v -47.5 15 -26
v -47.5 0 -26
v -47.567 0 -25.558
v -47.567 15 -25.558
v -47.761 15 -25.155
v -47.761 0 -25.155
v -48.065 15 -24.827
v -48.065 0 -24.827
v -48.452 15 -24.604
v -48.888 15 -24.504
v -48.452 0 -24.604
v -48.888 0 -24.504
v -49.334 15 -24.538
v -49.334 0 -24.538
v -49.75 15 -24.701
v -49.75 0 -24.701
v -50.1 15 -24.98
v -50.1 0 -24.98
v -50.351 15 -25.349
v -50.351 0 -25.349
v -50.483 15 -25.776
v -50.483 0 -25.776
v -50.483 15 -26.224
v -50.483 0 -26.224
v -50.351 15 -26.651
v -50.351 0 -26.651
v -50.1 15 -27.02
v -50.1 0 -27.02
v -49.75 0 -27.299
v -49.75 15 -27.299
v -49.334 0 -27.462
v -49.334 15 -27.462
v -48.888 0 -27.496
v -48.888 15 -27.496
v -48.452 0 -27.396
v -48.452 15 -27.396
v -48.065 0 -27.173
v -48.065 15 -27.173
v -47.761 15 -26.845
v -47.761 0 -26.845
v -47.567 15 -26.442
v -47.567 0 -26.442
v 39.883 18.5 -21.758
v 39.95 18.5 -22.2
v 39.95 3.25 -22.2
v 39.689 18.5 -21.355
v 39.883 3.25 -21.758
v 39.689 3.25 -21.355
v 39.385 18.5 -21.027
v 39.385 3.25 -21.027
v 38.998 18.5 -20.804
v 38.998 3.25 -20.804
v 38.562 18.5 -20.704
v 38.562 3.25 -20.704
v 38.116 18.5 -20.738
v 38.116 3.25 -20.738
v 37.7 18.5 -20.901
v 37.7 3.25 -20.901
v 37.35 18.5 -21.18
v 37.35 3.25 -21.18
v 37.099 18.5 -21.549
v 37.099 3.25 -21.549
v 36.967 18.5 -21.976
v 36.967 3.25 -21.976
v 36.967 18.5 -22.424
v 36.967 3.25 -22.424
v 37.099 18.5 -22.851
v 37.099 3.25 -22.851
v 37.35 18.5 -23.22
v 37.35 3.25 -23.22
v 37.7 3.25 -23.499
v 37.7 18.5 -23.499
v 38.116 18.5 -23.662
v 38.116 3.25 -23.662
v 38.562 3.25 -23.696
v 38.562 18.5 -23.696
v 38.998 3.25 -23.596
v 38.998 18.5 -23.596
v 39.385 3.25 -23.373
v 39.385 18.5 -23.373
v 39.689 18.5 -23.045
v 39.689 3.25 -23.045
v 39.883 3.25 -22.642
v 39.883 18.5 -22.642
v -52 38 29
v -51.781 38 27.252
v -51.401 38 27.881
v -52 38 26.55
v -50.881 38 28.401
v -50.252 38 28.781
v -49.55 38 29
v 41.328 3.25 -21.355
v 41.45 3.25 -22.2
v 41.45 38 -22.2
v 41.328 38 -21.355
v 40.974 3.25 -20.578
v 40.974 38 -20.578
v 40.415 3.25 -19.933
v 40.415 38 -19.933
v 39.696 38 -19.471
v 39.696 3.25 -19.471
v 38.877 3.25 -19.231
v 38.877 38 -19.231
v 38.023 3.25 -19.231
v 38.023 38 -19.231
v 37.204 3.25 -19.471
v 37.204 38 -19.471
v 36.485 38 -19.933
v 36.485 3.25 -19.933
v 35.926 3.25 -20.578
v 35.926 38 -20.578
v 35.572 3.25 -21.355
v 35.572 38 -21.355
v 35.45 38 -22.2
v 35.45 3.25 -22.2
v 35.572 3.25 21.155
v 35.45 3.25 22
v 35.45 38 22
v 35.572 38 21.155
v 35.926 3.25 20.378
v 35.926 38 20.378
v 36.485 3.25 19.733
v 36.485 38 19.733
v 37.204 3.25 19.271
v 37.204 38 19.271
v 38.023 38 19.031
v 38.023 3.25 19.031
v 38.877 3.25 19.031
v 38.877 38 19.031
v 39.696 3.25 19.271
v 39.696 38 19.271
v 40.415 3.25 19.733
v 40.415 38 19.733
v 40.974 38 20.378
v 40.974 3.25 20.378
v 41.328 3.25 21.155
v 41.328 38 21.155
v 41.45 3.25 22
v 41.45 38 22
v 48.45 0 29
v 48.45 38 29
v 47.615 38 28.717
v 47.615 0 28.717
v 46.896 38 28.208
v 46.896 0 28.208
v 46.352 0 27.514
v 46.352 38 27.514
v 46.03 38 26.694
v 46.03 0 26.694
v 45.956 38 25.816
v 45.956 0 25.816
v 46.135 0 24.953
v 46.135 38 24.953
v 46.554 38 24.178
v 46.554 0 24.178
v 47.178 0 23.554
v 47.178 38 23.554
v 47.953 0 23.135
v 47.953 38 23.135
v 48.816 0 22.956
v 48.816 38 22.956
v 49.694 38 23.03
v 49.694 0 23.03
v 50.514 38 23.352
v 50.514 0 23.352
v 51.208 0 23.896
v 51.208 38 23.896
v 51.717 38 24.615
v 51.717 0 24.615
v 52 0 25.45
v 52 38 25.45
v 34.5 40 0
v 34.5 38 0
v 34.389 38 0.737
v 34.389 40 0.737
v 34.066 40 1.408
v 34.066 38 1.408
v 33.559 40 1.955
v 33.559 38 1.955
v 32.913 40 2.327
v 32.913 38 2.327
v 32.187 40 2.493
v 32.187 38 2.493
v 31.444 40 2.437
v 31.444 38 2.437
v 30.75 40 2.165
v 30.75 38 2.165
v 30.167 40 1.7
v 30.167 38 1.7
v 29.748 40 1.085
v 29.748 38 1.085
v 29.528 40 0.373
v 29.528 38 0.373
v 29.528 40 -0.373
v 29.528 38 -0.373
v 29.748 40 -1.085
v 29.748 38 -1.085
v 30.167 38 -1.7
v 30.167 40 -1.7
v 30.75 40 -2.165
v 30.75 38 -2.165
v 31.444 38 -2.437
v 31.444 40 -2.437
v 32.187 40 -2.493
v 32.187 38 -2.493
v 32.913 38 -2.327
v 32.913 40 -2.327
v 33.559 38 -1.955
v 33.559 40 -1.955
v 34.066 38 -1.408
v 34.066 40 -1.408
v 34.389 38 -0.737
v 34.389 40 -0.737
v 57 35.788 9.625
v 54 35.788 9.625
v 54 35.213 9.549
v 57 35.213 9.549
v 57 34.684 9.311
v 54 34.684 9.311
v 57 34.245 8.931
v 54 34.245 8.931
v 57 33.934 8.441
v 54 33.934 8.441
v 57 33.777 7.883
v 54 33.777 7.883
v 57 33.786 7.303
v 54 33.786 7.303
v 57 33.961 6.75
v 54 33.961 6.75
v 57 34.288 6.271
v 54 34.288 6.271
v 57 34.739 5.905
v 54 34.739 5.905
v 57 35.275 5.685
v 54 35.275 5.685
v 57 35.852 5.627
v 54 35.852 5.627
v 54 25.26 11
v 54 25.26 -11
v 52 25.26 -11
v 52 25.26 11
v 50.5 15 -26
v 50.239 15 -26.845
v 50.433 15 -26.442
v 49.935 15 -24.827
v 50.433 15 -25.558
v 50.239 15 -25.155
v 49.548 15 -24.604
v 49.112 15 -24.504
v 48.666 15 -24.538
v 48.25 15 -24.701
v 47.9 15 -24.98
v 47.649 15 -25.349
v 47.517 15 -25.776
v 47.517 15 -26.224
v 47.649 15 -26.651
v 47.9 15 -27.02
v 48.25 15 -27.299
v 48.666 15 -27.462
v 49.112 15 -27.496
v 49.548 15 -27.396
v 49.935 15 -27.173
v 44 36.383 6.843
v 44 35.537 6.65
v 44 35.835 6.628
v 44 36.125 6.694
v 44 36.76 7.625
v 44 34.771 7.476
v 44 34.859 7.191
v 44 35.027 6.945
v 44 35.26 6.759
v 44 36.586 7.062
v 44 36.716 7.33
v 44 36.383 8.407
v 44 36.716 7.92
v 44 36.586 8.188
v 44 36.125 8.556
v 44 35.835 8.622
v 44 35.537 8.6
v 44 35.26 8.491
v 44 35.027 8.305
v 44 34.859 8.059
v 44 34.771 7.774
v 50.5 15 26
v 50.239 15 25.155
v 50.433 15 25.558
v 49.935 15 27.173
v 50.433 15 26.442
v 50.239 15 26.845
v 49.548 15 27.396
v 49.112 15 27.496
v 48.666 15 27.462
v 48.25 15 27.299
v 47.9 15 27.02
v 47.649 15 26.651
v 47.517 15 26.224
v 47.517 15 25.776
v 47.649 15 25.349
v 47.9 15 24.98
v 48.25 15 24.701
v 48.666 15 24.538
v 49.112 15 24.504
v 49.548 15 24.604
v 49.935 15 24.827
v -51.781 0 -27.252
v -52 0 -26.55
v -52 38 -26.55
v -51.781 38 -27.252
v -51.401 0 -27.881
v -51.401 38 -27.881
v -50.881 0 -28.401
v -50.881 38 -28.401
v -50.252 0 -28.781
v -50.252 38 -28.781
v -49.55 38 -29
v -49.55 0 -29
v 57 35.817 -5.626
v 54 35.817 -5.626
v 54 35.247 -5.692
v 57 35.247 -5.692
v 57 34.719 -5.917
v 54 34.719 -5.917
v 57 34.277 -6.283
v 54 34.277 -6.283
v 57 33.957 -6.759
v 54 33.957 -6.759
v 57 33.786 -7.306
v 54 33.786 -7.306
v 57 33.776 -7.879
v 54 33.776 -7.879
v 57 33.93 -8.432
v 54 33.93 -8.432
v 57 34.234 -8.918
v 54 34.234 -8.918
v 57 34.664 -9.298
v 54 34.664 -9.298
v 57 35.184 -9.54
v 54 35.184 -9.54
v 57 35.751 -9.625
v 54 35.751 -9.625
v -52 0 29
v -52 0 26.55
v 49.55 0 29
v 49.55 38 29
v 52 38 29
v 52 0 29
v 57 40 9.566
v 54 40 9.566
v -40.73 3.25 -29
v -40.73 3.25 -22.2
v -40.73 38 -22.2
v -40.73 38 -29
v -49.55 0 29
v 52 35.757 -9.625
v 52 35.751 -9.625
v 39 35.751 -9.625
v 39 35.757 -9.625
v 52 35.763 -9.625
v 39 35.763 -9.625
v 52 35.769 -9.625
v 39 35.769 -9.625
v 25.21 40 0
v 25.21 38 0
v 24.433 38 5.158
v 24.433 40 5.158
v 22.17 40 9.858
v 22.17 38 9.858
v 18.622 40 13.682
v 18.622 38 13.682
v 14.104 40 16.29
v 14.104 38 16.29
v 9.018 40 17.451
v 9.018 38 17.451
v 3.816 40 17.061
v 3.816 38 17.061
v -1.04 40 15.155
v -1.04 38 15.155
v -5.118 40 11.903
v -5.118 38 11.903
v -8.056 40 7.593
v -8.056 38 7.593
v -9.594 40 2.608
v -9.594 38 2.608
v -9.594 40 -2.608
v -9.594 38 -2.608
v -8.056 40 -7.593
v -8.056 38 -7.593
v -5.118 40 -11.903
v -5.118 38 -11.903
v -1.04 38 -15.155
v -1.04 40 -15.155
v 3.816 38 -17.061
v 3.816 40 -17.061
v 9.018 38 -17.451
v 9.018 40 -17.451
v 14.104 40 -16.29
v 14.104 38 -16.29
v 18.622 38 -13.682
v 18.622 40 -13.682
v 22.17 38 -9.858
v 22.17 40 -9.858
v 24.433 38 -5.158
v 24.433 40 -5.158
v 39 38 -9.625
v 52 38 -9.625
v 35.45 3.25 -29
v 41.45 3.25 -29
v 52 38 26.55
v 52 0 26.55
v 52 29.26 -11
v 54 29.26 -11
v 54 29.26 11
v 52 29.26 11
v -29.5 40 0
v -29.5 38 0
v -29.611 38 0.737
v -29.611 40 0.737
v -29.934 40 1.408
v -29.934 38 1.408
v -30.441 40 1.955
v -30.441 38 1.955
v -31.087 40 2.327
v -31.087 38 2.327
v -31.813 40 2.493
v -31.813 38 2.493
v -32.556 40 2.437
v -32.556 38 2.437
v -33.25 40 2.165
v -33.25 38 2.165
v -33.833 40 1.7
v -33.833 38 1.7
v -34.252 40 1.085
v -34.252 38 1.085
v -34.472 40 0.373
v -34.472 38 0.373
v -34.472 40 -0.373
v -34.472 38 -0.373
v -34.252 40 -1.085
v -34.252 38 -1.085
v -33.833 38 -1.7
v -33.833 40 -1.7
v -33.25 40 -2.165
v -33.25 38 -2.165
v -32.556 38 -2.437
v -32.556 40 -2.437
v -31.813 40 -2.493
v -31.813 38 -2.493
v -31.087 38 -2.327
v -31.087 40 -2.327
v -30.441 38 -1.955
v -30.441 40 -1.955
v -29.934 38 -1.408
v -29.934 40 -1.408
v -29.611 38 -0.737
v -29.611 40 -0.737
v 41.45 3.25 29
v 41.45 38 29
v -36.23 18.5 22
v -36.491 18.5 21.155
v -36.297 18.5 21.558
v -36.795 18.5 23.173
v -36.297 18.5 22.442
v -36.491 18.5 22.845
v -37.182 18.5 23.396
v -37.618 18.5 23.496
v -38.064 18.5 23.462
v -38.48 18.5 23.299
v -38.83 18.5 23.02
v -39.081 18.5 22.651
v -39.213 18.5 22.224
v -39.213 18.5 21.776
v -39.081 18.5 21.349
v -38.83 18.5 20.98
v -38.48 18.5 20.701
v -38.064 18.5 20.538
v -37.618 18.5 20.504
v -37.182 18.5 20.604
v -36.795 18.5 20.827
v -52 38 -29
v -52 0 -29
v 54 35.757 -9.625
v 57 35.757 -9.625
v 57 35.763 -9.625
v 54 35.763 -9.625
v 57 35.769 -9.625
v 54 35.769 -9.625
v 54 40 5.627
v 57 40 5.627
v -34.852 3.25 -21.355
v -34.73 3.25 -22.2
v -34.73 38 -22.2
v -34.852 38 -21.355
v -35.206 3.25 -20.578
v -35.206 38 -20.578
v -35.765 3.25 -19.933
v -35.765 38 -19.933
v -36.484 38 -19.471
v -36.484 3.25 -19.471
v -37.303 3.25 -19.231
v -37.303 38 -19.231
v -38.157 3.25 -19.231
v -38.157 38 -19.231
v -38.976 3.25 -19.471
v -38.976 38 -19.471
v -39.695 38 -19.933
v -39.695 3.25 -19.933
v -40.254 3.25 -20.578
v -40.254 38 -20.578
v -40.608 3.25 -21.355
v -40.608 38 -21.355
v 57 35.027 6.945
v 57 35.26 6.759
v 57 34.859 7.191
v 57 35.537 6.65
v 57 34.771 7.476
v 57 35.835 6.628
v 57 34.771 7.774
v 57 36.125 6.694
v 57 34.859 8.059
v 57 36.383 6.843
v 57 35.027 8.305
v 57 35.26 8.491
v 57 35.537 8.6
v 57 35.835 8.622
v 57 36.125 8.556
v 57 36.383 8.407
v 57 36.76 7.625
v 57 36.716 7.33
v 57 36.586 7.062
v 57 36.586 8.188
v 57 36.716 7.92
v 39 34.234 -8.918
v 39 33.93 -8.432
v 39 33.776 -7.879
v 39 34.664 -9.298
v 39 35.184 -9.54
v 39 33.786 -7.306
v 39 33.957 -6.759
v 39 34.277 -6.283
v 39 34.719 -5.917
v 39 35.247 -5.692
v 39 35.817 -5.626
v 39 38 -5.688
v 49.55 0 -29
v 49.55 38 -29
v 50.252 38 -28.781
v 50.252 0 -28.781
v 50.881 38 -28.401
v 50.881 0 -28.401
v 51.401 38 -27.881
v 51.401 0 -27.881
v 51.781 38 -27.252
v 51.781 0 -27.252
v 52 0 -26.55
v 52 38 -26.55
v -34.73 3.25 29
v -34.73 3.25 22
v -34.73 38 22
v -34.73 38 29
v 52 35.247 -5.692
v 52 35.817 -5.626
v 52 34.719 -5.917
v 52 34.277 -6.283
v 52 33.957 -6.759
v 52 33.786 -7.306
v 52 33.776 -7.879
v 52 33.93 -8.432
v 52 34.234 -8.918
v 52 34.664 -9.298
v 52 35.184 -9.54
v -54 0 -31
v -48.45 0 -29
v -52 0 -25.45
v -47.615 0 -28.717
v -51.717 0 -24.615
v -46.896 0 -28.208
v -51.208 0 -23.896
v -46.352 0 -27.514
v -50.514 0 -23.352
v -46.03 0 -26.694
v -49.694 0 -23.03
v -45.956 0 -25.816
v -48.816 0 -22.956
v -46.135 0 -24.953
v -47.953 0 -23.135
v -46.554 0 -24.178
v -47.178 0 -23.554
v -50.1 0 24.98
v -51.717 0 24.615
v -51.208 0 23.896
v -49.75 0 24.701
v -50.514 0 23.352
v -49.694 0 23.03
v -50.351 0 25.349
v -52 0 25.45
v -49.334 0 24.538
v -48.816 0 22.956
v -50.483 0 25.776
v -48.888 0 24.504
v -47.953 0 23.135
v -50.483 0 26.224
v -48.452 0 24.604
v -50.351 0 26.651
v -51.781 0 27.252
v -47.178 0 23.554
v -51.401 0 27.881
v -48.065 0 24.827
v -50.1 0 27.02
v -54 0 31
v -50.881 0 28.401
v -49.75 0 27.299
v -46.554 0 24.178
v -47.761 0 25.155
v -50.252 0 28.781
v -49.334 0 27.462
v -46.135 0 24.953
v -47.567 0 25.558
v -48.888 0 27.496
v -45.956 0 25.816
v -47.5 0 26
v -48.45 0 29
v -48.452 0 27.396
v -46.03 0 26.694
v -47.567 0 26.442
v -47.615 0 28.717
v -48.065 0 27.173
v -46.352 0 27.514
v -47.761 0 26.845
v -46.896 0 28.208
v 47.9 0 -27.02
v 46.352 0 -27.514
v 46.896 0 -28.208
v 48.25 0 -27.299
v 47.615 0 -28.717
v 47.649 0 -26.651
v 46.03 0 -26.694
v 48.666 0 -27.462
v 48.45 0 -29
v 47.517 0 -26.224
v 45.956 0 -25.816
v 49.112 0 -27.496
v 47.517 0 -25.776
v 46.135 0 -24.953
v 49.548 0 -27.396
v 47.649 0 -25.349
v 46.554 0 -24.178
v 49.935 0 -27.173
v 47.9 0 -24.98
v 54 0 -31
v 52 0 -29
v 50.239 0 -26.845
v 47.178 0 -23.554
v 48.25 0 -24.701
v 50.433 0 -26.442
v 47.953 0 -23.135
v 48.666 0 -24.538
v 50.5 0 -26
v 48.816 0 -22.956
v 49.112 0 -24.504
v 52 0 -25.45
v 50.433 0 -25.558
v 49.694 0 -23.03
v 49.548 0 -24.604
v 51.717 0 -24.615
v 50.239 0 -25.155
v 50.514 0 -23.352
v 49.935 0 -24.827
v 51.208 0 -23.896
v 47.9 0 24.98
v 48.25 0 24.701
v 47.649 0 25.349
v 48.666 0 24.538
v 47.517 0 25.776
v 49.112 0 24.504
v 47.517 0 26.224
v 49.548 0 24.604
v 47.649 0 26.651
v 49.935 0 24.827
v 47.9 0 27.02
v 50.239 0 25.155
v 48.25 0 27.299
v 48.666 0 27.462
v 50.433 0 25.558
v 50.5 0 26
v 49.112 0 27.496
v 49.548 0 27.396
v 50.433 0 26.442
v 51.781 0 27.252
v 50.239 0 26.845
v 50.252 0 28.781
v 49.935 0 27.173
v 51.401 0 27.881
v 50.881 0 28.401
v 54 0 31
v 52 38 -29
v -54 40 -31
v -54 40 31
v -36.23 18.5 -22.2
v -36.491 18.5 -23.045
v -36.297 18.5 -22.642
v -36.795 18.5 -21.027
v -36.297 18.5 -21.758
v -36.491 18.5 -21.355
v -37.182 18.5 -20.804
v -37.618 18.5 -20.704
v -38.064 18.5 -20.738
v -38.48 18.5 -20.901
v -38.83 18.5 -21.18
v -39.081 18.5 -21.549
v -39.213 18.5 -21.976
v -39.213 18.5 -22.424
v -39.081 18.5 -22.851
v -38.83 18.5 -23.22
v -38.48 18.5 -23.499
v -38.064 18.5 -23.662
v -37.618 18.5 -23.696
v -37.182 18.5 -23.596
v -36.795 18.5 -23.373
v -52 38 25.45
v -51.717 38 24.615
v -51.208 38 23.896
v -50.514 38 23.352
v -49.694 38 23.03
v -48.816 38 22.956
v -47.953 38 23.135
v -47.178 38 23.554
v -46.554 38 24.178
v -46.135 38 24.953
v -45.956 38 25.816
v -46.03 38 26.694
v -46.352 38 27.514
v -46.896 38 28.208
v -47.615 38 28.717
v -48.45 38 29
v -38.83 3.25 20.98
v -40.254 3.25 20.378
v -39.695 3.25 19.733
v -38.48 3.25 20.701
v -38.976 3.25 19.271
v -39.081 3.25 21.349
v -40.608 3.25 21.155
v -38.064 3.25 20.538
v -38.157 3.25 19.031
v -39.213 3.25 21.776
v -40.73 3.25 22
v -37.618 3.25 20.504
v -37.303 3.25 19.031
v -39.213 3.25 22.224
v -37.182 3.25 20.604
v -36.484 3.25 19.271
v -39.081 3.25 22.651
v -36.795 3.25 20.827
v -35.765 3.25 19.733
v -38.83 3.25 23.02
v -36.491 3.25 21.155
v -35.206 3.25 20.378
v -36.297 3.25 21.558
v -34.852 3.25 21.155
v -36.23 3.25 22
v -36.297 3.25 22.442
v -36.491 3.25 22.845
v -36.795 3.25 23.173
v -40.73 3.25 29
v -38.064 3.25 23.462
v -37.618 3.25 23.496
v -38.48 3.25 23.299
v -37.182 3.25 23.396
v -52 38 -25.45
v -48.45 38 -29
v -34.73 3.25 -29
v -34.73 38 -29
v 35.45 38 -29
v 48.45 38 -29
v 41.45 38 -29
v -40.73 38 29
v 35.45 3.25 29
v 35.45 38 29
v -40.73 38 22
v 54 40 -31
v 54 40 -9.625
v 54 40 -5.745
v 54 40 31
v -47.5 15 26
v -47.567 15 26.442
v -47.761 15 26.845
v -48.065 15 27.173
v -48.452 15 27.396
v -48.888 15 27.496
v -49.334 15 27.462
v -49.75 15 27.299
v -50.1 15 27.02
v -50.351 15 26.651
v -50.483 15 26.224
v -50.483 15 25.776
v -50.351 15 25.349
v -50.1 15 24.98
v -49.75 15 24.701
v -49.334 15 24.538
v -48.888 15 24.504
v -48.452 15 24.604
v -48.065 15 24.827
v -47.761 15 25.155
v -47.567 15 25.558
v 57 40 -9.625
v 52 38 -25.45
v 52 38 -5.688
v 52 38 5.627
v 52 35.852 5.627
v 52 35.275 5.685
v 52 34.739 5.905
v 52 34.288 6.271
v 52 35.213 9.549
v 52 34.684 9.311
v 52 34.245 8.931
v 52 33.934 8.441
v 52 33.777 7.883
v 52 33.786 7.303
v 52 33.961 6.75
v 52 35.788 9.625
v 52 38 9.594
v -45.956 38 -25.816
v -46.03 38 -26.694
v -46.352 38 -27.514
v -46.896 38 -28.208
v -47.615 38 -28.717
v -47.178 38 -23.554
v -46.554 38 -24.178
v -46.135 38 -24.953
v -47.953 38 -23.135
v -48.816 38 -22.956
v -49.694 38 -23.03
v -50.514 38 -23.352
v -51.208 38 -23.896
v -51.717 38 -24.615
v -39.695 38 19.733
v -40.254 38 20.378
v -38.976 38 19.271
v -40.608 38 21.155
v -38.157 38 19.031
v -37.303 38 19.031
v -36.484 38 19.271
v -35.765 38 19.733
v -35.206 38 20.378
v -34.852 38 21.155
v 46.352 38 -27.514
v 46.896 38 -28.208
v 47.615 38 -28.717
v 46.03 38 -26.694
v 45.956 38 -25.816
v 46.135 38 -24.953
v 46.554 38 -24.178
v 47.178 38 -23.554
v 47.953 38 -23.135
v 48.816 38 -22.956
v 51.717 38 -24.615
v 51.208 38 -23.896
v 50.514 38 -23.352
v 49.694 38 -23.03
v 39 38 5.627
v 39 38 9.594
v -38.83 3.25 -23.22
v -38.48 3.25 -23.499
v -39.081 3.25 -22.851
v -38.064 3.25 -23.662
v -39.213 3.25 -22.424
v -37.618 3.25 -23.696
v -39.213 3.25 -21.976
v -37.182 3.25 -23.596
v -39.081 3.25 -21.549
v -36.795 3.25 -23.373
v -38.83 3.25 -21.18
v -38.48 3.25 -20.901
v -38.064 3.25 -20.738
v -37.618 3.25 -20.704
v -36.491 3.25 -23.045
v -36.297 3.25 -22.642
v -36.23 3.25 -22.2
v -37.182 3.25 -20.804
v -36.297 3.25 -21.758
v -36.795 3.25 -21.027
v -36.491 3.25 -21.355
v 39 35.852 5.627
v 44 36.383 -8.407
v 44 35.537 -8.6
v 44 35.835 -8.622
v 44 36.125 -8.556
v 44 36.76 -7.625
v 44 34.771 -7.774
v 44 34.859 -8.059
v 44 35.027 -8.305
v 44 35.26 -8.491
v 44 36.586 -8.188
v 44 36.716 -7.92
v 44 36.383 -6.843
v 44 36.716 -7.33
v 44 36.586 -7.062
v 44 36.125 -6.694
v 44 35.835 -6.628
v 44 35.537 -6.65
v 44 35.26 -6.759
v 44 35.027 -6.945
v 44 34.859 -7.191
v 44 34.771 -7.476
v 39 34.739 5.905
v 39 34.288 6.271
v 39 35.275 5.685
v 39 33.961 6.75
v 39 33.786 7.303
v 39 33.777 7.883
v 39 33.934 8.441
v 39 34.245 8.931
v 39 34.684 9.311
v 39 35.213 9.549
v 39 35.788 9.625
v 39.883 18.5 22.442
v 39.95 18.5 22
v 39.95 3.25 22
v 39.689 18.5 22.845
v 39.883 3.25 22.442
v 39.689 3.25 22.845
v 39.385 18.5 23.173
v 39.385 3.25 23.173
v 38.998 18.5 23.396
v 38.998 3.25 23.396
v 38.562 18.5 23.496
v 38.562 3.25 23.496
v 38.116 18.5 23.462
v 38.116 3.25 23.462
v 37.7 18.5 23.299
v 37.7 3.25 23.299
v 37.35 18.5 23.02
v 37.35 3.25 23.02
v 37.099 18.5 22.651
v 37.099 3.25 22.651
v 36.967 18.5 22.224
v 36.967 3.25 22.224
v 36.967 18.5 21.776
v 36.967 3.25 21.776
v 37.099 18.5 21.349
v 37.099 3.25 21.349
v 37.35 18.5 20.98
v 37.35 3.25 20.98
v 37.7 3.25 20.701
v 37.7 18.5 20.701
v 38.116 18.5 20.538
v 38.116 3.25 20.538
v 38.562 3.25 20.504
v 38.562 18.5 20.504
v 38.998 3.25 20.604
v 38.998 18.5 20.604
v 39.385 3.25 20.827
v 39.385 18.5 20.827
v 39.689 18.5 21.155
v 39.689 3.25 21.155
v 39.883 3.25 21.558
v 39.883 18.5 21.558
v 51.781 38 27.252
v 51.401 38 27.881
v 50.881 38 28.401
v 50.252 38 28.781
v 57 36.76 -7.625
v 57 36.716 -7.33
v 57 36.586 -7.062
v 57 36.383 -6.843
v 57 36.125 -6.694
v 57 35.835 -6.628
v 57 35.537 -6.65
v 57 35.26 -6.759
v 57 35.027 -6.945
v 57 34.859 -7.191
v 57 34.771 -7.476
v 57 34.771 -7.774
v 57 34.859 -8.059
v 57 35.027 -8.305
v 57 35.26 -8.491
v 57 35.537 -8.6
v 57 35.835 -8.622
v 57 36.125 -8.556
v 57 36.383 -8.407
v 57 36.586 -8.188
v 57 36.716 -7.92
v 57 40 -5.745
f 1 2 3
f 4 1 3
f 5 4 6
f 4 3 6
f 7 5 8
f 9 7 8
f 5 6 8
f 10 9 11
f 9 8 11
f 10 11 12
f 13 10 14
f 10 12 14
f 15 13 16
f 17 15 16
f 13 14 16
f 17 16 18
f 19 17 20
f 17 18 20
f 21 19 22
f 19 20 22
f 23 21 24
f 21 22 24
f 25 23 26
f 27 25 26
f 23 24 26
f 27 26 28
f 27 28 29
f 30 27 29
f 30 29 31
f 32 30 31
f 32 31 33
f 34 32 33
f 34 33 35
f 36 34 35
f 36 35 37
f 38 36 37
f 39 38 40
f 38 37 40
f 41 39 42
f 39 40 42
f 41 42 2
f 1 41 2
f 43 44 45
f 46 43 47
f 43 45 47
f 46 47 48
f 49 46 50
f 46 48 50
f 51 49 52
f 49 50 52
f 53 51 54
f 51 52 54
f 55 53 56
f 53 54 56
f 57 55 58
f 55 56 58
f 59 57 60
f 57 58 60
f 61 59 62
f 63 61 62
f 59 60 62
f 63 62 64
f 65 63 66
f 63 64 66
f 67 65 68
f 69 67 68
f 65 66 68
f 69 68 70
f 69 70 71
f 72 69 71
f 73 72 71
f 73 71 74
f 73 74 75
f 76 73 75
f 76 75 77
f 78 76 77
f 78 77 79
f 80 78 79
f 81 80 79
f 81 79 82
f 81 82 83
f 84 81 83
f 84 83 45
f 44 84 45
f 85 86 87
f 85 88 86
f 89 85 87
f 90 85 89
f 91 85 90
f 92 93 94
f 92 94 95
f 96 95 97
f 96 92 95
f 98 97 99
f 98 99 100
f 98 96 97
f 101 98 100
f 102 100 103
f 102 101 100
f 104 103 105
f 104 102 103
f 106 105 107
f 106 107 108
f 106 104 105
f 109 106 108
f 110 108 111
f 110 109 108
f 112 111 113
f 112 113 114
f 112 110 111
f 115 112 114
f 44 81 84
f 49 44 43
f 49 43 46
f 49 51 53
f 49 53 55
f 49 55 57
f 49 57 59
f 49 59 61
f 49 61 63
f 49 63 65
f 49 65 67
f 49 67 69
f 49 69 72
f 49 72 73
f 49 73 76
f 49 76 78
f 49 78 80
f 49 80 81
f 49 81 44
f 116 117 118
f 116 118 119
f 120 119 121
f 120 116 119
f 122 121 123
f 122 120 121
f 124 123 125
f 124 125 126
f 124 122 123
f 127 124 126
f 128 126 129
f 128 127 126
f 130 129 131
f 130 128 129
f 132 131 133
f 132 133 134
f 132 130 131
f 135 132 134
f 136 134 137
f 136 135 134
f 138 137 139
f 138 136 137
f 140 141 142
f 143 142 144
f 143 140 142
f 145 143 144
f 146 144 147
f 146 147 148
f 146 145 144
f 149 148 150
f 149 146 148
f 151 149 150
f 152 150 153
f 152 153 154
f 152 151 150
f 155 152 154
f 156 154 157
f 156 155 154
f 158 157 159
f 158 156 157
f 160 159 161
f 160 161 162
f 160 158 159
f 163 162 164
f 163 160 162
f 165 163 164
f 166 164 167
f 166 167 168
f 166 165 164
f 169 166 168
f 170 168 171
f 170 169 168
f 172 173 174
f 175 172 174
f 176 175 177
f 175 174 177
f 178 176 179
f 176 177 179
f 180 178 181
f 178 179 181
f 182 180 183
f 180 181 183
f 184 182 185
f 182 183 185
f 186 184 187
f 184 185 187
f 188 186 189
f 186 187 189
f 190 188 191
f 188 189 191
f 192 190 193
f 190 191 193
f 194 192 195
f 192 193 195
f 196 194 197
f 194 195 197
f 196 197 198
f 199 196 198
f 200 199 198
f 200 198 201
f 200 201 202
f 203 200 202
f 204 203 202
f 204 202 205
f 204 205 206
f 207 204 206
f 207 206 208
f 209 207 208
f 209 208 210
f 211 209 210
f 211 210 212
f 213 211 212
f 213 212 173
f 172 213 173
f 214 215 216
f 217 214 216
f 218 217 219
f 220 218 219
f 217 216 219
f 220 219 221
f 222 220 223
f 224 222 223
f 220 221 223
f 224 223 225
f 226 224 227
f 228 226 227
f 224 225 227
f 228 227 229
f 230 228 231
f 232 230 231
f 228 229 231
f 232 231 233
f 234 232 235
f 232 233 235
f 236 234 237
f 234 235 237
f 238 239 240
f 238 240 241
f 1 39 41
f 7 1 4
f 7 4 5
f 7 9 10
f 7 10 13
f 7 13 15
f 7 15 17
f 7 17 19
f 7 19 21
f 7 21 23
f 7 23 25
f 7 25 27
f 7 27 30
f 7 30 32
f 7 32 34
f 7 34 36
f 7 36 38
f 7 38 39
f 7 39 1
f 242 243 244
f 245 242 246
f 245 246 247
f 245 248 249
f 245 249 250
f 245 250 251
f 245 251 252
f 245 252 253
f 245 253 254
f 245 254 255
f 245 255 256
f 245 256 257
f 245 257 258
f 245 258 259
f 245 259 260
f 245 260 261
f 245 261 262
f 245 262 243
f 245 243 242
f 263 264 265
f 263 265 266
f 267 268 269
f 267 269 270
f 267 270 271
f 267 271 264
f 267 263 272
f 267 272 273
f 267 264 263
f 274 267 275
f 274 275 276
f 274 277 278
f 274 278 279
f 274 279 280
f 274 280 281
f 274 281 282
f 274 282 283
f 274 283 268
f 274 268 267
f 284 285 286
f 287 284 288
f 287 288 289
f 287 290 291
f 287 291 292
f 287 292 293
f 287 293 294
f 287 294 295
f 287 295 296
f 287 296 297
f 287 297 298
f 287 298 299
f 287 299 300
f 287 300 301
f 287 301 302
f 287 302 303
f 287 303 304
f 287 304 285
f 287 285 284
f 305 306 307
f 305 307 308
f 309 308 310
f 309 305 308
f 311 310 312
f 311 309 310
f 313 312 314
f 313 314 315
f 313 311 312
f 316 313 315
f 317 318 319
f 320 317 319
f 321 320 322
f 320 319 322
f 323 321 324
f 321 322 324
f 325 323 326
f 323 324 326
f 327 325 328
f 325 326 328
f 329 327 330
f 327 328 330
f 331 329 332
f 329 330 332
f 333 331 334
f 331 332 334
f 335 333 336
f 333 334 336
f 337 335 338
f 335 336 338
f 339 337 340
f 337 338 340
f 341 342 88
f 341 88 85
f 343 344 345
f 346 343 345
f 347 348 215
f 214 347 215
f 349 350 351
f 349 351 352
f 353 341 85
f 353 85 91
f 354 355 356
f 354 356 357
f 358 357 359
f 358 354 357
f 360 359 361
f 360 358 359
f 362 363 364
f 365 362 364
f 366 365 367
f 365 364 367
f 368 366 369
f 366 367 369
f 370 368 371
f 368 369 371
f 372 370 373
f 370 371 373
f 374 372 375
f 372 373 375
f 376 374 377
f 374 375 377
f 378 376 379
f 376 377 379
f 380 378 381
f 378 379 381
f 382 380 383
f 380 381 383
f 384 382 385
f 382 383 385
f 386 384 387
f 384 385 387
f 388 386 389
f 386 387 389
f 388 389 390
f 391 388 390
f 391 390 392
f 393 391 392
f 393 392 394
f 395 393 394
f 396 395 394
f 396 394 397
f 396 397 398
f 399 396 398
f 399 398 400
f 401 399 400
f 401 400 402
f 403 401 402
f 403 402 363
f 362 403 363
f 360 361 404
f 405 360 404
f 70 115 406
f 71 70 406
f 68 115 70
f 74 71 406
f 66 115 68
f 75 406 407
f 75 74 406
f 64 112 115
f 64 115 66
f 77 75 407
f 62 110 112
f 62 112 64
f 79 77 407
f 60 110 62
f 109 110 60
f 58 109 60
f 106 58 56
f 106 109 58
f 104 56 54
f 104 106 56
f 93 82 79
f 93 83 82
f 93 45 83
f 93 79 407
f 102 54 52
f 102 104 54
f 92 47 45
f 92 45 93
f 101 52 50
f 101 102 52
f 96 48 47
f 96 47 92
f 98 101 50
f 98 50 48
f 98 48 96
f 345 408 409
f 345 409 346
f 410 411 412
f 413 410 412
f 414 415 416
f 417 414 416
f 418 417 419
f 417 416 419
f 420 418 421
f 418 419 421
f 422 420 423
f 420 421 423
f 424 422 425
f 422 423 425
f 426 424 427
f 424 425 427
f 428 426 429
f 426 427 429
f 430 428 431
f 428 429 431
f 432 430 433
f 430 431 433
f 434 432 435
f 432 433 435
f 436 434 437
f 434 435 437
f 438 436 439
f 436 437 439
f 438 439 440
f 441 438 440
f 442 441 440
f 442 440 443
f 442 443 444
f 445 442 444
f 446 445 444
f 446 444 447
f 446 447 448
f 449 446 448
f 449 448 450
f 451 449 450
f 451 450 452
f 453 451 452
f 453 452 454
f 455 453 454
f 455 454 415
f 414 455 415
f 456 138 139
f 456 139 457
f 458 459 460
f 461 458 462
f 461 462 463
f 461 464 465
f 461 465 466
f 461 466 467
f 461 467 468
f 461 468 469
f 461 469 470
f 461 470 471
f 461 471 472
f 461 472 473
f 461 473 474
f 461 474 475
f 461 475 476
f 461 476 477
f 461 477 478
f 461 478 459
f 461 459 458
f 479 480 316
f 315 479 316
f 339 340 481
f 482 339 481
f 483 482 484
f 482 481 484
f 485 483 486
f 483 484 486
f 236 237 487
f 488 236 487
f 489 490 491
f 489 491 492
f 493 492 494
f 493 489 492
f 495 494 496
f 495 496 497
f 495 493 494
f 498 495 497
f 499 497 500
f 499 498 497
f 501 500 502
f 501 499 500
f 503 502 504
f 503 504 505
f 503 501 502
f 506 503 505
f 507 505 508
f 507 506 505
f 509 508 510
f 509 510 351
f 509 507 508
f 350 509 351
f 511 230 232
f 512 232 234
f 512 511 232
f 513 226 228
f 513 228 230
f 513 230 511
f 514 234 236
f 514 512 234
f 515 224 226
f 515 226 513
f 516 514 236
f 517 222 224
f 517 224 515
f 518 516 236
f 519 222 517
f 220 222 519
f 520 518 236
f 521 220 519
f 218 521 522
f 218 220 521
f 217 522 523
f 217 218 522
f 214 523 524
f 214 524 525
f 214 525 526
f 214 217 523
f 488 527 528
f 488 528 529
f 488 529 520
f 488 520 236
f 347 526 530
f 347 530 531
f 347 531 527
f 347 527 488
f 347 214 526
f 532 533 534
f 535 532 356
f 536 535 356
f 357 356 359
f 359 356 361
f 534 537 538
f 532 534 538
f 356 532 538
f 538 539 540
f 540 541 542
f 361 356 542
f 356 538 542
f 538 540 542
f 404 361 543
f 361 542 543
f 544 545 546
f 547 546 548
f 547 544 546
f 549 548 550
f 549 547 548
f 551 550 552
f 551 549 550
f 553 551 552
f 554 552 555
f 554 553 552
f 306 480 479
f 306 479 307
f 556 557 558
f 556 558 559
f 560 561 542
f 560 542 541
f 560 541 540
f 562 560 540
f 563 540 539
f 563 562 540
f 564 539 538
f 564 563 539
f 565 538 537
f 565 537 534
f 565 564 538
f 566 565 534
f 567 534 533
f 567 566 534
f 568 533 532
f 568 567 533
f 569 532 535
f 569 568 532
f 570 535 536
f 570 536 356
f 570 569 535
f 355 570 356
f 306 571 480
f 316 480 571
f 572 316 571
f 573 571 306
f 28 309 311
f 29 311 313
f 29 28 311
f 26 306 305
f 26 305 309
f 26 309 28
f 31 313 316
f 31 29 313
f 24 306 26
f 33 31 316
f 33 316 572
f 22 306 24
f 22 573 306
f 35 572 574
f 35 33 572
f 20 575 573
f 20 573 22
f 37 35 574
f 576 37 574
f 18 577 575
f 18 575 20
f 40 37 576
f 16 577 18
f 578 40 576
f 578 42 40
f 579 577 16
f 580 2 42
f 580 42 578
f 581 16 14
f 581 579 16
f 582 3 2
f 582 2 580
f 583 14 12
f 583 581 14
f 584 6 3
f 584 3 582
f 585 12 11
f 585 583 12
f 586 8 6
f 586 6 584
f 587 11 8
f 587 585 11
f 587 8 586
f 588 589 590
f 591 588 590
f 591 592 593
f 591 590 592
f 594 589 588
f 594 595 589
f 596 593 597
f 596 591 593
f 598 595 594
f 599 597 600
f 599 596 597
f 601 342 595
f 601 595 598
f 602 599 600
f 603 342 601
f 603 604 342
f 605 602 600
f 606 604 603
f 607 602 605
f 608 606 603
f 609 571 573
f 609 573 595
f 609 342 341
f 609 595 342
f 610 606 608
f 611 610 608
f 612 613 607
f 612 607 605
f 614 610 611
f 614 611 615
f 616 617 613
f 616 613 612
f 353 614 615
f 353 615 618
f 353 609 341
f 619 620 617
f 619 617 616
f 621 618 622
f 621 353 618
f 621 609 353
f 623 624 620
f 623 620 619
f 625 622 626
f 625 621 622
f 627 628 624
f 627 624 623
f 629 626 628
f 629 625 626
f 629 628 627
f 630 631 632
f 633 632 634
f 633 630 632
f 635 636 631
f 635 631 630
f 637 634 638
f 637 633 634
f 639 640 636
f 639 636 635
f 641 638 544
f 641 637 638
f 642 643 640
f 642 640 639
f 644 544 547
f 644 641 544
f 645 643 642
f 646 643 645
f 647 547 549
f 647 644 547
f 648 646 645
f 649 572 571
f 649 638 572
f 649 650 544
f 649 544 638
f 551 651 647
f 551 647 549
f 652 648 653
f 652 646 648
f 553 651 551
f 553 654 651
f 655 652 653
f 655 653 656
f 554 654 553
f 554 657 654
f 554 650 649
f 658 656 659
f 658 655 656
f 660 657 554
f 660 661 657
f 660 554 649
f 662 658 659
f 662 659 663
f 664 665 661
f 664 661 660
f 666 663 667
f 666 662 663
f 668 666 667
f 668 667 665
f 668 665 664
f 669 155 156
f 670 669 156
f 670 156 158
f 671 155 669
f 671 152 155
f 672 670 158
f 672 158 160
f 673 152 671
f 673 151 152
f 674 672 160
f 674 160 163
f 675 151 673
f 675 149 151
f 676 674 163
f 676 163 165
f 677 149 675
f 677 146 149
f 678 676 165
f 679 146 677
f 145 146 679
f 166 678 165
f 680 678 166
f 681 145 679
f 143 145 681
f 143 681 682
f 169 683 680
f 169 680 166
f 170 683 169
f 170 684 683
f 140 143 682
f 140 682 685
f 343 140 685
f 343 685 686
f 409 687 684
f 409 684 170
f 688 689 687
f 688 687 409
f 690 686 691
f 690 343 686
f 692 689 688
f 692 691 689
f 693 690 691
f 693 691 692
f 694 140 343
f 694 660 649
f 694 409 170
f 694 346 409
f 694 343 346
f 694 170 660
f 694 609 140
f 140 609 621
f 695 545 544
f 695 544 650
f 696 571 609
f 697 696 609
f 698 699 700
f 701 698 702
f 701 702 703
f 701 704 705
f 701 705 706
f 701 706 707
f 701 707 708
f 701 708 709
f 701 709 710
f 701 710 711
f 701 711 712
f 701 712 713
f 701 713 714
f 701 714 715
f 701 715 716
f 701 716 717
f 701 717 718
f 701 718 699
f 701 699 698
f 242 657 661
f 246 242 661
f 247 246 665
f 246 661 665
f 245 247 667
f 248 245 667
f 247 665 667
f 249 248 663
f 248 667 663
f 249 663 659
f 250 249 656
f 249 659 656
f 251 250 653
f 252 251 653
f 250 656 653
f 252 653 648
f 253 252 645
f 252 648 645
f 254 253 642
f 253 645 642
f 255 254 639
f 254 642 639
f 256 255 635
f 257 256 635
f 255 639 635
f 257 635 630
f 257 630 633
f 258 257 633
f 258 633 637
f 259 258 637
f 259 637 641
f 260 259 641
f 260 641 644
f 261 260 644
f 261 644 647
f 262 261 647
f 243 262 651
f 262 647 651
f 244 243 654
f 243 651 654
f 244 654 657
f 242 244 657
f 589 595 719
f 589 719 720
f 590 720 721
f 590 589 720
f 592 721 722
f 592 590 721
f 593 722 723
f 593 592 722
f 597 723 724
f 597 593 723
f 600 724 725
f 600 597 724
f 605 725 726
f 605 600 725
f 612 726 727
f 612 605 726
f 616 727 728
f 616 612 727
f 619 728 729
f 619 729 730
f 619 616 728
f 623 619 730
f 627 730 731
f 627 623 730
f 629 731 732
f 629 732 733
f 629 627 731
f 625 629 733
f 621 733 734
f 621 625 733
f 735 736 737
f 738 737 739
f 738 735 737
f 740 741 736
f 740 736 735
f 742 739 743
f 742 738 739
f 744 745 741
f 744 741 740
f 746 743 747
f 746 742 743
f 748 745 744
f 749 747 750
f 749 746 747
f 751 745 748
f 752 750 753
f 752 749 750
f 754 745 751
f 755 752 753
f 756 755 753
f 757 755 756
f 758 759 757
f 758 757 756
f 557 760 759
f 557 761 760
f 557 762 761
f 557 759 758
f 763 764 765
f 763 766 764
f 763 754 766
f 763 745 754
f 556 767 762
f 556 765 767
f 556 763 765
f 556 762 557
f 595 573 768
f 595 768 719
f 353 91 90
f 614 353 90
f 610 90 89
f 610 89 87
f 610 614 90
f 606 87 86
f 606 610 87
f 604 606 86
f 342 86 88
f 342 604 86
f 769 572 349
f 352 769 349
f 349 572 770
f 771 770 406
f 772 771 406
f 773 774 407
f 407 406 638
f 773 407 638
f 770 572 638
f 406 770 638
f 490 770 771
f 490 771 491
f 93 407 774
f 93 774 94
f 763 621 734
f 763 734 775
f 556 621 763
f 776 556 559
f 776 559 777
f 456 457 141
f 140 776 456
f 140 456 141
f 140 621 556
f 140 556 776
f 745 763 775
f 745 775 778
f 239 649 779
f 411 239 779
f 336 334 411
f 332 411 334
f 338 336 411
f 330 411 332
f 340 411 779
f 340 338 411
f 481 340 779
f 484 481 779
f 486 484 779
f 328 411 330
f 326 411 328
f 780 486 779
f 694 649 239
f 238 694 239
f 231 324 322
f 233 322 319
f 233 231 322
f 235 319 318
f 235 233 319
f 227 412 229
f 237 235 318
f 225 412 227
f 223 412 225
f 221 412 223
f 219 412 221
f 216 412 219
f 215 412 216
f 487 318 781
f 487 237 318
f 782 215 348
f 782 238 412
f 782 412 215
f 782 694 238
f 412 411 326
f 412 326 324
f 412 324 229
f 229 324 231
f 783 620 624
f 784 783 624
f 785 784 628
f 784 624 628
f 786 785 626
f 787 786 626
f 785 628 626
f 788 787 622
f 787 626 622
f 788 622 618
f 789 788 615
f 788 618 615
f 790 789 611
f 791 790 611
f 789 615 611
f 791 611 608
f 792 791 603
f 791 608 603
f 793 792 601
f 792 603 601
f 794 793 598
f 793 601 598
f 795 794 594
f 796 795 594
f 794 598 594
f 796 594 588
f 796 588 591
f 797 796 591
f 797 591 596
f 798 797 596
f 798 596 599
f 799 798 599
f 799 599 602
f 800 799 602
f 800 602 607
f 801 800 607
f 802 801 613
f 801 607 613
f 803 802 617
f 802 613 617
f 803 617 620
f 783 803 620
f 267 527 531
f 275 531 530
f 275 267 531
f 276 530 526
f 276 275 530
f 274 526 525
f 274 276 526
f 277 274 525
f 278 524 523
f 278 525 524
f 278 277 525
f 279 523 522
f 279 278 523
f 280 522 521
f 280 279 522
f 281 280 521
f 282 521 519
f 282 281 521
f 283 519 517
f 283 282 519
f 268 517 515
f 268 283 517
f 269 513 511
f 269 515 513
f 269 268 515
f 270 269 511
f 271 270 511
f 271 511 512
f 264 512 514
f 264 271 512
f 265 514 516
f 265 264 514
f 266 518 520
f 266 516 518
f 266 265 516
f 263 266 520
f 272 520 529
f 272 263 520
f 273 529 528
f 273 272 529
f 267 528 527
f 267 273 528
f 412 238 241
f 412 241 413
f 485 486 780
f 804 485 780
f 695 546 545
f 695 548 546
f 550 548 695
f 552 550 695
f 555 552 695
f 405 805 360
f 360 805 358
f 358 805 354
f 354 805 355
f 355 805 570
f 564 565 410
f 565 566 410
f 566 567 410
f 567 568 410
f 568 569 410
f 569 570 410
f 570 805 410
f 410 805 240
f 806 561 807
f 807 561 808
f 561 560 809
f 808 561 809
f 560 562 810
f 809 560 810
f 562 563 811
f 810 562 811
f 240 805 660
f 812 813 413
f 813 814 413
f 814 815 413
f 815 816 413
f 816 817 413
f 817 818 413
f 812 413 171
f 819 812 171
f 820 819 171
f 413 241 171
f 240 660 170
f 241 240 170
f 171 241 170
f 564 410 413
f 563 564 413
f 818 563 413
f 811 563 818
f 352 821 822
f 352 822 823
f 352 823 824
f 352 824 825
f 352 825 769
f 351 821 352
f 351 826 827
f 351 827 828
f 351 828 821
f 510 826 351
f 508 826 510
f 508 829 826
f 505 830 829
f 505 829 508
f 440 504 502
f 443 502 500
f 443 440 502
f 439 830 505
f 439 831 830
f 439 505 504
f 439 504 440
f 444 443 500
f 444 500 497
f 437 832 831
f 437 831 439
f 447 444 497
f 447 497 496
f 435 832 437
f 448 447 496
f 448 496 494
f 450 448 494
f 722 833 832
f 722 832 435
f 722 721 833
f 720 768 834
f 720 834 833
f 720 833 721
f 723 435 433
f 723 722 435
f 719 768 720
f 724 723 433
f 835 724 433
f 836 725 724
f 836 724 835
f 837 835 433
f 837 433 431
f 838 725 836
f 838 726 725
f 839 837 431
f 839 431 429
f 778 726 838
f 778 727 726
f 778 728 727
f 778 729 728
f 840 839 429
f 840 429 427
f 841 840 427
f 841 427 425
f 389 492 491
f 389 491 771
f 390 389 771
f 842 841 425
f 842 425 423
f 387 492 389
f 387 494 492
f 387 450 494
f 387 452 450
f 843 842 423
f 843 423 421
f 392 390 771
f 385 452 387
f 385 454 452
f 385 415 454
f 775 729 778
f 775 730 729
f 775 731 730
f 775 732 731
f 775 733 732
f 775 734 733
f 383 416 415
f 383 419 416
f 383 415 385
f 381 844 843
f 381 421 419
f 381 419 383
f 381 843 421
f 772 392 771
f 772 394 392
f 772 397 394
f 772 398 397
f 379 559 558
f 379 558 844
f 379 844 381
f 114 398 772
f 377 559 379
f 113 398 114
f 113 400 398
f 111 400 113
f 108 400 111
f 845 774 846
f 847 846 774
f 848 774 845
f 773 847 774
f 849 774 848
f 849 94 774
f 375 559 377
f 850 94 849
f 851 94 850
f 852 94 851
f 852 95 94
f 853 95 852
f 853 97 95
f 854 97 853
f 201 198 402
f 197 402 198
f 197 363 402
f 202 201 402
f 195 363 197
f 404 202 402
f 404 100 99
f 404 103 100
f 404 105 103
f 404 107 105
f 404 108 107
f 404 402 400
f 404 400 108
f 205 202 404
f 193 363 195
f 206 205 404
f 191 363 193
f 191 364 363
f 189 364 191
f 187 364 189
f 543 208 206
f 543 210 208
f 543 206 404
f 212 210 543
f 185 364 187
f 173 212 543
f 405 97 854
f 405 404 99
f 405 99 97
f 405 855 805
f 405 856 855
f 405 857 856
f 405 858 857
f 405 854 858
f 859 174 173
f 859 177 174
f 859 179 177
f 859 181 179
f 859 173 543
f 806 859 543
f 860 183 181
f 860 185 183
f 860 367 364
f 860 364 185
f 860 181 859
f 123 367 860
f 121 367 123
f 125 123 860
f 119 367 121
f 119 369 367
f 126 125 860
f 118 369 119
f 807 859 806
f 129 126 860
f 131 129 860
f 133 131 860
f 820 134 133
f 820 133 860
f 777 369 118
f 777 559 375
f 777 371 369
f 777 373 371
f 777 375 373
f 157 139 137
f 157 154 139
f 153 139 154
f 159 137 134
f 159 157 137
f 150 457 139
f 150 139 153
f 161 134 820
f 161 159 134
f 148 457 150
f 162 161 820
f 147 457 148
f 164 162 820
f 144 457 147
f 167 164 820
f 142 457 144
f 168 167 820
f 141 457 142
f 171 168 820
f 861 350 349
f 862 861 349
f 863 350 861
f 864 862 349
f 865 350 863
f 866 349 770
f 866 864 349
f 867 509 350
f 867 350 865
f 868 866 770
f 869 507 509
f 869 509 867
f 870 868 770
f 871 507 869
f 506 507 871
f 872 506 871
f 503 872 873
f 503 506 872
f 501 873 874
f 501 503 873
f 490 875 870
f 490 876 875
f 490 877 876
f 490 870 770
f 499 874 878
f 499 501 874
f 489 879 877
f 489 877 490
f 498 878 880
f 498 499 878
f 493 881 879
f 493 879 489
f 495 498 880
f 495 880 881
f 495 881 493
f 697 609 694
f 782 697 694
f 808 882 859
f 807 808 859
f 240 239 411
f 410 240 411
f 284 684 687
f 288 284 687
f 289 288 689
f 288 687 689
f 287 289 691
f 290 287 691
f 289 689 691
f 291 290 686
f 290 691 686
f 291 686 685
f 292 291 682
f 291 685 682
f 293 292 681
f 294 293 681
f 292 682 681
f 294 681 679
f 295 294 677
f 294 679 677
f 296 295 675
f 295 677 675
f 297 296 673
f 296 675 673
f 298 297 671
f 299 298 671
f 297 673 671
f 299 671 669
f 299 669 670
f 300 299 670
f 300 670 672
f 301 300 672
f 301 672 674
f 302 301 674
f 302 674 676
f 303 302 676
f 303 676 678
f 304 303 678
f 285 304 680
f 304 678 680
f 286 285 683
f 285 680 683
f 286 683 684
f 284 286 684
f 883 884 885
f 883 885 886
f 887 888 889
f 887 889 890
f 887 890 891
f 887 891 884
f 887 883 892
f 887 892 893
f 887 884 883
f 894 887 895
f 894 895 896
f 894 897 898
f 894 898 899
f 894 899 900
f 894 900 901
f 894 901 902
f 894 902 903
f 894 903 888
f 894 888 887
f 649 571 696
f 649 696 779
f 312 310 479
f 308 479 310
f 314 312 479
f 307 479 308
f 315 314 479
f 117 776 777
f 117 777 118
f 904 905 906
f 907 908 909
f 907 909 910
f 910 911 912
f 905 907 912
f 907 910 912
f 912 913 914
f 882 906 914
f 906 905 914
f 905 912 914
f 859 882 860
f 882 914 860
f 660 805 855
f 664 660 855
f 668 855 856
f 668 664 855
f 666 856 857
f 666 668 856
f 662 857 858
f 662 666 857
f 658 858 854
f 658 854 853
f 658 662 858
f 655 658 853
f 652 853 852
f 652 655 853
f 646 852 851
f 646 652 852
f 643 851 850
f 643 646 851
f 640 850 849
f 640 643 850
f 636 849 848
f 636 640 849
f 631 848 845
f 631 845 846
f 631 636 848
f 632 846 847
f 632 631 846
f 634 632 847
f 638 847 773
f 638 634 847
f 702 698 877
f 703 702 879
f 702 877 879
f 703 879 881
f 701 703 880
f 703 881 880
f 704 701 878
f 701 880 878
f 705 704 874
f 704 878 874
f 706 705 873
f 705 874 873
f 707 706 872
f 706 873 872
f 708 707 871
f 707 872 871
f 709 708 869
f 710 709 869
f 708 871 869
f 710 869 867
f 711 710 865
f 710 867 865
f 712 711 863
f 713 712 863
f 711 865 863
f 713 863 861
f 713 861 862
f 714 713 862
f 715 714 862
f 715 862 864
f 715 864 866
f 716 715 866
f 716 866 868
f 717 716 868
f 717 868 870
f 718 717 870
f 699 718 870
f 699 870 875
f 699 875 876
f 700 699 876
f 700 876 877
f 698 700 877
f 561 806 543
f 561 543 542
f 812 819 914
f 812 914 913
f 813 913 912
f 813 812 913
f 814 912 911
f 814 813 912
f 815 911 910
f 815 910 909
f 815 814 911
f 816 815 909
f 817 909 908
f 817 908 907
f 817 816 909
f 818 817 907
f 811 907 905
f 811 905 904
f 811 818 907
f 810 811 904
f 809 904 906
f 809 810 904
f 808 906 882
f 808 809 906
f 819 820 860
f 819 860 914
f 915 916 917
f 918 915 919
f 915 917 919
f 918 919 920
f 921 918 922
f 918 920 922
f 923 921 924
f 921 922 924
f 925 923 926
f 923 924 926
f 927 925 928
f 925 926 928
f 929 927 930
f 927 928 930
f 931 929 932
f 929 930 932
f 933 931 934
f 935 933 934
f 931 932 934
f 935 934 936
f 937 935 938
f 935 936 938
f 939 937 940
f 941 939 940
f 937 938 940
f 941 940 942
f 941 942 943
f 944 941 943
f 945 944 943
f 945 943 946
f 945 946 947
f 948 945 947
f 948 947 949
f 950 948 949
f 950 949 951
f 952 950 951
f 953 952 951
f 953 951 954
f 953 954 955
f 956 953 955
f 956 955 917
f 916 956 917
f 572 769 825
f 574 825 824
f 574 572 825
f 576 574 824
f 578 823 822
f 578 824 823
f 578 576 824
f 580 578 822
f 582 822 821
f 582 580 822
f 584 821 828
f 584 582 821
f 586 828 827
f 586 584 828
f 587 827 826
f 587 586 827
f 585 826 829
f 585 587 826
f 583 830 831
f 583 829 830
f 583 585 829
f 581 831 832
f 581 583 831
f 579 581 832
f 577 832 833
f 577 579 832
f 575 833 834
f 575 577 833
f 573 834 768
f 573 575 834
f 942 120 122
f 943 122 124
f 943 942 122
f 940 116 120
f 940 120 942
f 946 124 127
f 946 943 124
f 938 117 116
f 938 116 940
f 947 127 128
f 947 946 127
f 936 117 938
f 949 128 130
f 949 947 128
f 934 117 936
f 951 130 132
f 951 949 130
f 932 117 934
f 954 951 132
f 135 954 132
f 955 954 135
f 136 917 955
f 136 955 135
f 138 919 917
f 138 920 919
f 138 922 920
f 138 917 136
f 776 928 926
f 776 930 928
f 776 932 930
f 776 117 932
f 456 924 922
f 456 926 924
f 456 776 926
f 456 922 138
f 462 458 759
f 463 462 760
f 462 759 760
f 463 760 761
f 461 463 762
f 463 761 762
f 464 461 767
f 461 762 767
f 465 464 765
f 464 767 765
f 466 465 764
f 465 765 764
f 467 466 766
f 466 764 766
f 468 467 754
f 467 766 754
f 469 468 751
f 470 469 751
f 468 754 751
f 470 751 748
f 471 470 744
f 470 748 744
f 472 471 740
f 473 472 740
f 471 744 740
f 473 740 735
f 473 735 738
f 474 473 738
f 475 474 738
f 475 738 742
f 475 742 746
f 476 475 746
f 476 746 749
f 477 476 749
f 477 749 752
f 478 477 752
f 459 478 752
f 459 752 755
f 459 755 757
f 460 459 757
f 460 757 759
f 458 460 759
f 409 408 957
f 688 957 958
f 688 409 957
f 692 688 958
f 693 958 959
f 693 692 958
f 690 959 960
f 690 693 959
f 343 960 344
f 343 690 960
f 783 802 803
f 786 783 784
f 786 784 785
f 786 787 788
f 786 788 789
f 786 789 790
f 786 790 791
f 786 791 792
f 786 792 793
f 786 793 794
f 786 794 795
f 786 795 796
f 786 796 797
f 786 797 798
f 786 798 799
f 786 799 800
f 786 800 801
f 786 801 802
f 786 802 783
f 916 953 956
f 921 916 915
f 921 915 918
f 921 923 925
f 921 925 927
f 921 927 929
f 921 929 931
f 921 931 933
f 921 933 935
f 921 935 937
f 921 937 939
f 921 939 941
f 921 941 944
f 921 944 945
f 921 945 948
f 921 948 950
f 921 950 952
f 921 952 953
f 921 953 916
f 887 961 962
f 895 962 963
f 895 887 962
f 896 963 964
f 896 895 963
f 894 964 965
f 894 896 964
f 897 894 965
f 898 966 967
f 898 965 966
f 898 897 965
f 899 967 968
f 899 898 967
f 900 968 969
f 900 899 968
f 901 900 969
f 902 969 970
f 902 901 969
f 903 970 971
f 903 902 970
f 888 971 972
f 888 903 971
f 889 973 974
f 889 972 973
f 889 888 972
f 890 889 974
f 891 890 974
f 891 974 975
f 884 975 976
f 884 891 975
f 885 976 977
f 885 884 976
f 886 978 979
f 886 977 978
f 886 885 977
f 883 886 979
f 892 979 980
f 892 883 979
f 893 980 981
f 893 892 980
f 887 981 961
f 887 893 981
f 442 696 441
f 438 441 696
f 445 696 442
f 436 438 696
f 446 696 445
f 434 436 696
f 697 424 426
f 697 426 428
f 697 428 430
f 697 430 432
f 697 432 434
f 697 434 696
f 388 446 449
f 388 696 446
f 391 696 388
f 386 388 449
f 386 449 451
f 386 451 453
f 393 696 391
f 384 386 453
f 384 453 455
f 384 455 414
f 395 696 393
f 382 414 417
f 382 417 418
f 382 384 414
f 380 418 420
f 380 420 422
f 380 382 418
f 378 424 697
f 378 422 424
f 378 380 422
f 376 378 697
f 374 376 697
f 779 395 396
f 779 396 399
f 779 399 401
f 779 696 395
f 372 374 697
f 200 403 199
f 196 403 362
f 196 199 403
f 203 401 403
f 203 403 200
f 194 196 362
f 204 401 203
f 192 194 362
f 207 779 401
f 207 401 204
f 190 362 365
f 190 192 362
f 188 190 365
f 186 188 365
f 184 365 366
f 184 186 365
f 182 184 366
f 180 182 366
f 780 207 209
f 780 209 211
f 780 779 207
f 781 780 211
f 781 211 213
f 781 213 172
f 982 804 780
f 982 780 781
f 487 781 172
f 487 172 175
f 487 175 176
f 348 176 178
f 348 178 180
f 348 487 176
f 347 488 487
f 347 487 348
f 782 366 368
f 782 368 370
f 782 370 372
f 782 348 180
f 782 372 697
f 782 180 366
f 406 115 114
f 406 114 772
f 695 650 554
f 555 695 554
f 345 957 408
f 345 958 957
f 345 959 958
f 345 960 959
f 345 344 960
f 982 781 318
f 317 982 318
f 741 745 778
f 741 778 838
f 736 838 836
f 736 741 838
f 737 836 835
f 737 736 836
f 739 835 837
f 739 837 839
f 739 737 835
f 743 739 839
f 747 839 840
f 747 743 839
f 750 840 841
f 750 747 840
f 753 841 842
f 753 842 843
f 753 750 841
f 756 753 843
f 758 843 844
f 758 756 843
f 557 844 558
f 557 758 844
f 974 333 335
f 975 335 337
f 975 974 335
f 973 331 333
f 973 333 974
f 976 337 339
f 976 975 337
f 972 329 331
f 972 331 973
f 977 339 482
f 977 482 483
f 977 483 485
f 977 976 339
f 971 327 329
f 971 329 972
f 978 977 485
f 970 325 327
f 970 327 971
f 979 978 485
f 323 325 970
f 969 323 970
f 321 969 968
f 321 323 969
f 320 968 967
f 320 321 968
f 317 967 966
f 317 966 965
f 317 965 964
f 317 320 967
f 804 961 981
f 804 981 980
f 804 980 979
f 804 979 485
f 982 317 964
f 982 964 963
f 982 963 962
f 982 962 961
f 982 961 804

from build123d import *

# Parameters (mm, degrees)
F0_W           = 108
F0_H           = 62
F1_DEPTH       = 40
F2_W           = 104
F2_H           = 58
F3_DEPTH       = 38
F5_START       = -3.25
F5_DEPTH       = 34.75
F6_R           = 3.05
F7_DEPTH       = 38
F8_R           = 1.5
F9_DEPTH       = 15
F10_R          = 1.5
F11_DEPTH      = 18.5
F12_R          = 17.5
F12_R_2        = 2.5
F13_DEPTH      = 40.001
F16_DEPTH      = 15
F16_DEPTH_BACK = 3
F17_W          = 4
F17_H          = 22
F18_DEPTH      = 2
F19_R          = 1
F20_DEPTH      = 10
F20_DEPTH_BACK = 5


with BuildPart() as f1:
    # F0 (on Front) → F1 (new body)
    with BuildSketch(Plane.XZ):
        Rectangle(F0_W, F0_H)
    extrude(amount=-F1_DEPTH)

    # F2 (on Front) → F3 (cut)
    with BuildSketch(Plane.XZ):
        Rectangle(F2_W, F2_H)
    extrude(amount=-F3_DEPTH, mode=Mode.SUBTRACT)

    # F4 (on Front) → F5 (join)
    with BuildSketch(Plane.XZ.offset(F5_START)):
        with BuildLine():
            ThreePointArc((-40.73, 22), (-37.73, 19), (-34.73, 22))
            ThreePointArc((-34.73, 22), (-37.73, 25), (-40.73, 22))
        make_face()
        with BuildLine():
            ThreePointArc((-40.73, 22), (-37.73, 25), (-34.73, 22))
            Line((-34.73, 22), (-34.73, 29.0249657466))
            Line((-34.73, 29.0249657466), (-40.73, 29.0249657466))
            Line((-40.73, 29.0249657466), (-40.73, 22))
        make_face()
        with BuildLine():
            ThreePointArc((35.45, 22), (38.45, 19), (41.45, 22))
            ThreePointArc((41.45, 22), (38.45, 25), (35.45, 22))
        make_face()
        with BuildLine():
            ThreePointArc((35.45, 22), (38.45, 25), (41.45, 22))
            Line((41.45, 22), (41.45, 29.0909428149))
            Line((41.45, 29.0909428149), (35.45, 29.1012134403))
            Line((35.45, 29.1012134403), (35.45, 22))
        make_face()
        with BuildLine():
            ThreePointArc((-40.73, -22.2), (-37.73, -25.2), (-34.73, -22.2))
            ThreePointArc((-34.73, -22.2), (-37.73, -19.2), (-40.73, -22.2))
        make_face()
        with BuildLine():
            Line((-34.73, -29.2853660554), (-34.73, -22.2))
            ThreePointArc((-34.73, -22.2), (-37.73, -25.2), (-40.73, -22.2))
            Line((-40.73, -22.2), (-40.73, -29.2745608509))
            Line((-40.73, -29.2745608509), (-34.73, -29.2853660554))
        make_face()
        with BuildLine():
            ThreePointArc((35.45, -22.2), (38.45, -25.2), (41.45, -22.2))
            ThreePointArc((41.45, -22.2), (38.45, -19.2), (35.45, -22.2))
        make_face()
        with BuildLine():
            Line((41.45, -29.2963500738), (41.45, -22.2))
            ThreePointArc((41.45, -22.2), (38.45, -25.2), (35.45, -22.2))
            Line((35.45, -22.2), (35.45, -29.2963500738))
            Line((35.45, -29.2963500738), (41.45, -29.2963500738))
        make_face()
    extrude(amount=-F5_DEPTH)

    # F6 (on Front) → F7 (join, through all)
    with BuildSketch(Plane.XZ):
        with Locations((-49, 26)):
            Circle(F6_R)
        with Locations((49, 26)):
            Circle(F6_R)
        with Locations((49, -26)):
            Circle(F6_R)
        with Locations((-49, -26)):
            Circle(F6_R)
    extrude(amount=-F7_DEPTH)

    # F8 (on Front) → F9 (cut)
    with BuildSketch(Plane.XZ):
        with Locations((-49, 26)):
            Circle(F8_R)
        with Locations((-49, -26)):
            Circle(F8_R)
        with Locations((49, -26)):
            Circle(F8_R)
        with Locations((49, 26)):
            Circle(F8_R)
    extrude(amount=-F9_DEPTH, mode=Mode.SUBTRACT)

    # F10 (on Front) → F11 (cut)
    with BuildSketch(Plane.XZ):
        with Locations((-37.73, 22)):
            Circle(F10_R)
        with Locations((-37.73, -22.2)):
            Circle(F10_R)
        with Locations((38.45, 22)):
            Circle(F10_R)
        with Locations((38.45, -22.2)):
            Circle(F10_R)
    extrude(amount=-F11_DEPTH, mode=Mode.SUBTRACT)

    # F12 (on Front) → F13 (cut, through all)
    with BuildSketch(Plane.XZ):
        with Locations((7.7104928971, 0)):
            Circle(F12_R)
        with Locations((-32, 0)):
            Circle(F12_R_2)
        with Locations((32, 0)):
            Circle(F12_R_2)
    extrude(amount=-F13_DEPTH, mode=Mode.SUBTRACT)

    # F15 (on offset) → F16 (join, two sides)
    with BuildSketch(Plane.YZ.offset(54)) as f16_sk:
        with BuildLine():
            Line((40, 9.5658428478), (35.7879940012, 9.6248040744))
            ThreePointArc((35.7879940012, 9.6248040744), (33.7602591267, 7.5928062172), (35.8523524108, 5.6271333798))
            Line((35.8523524108, 5.6271333798), (40, 5.6271333798))
            Line((40, 5.6271333798), (40, 9.5658428478))
        make_face()
        with BuildLine():
            Line((40, -5.7445825184), (35.8167641743, -5.6258057052))
            ThreePointArc((35.8167641743, -5.6258057052), (33.7602698715, -7.5921455752), (35.7510600226, -9.6249800191))
            ThreePointArc((35.7510600226, -9.6249800191), (35.76, -9.625), (35.7689399774, -9.6249800191))
            Line((35.7689399774, -9.6249800191), (40, -9.6249800191))
            Line((40, -9.6249800191), (40, -5.7445825184))
        make_face()
    extrude(amount=-F16_DEPTH)
    extrude(f16_sk.sketch, amount=F16_DEPTH_BACK)

    # F17 (on offset) → F18 (cut, through all)
    with BuildSketch(Plane.YZ.offset(54)):
        with Locations((27.26, 0)):
            Rectangle(F17_W, F17_H)
    extrude(amount=-F18_DEPTH, mode=Mode.SUBTRACT)

    # F19 (on offset) → F20 (cut, two sides)
    with BuildSketch(Plane.YZ.offset(54)) as f20_sk:
        with Locations((35.76, 7.625)):
            Circle(F19_R)
        with Locations((35.76, -7.625)):
            Circle(F19_R)
    extrude(amount=-F20_DEPTH, mode=Mode.SUBTRACT)
    extrude(f20_sk.sketch, amount=F20_DEPTH_BACK, mode=Mode.SUBTRACT)


solid = f1.part
